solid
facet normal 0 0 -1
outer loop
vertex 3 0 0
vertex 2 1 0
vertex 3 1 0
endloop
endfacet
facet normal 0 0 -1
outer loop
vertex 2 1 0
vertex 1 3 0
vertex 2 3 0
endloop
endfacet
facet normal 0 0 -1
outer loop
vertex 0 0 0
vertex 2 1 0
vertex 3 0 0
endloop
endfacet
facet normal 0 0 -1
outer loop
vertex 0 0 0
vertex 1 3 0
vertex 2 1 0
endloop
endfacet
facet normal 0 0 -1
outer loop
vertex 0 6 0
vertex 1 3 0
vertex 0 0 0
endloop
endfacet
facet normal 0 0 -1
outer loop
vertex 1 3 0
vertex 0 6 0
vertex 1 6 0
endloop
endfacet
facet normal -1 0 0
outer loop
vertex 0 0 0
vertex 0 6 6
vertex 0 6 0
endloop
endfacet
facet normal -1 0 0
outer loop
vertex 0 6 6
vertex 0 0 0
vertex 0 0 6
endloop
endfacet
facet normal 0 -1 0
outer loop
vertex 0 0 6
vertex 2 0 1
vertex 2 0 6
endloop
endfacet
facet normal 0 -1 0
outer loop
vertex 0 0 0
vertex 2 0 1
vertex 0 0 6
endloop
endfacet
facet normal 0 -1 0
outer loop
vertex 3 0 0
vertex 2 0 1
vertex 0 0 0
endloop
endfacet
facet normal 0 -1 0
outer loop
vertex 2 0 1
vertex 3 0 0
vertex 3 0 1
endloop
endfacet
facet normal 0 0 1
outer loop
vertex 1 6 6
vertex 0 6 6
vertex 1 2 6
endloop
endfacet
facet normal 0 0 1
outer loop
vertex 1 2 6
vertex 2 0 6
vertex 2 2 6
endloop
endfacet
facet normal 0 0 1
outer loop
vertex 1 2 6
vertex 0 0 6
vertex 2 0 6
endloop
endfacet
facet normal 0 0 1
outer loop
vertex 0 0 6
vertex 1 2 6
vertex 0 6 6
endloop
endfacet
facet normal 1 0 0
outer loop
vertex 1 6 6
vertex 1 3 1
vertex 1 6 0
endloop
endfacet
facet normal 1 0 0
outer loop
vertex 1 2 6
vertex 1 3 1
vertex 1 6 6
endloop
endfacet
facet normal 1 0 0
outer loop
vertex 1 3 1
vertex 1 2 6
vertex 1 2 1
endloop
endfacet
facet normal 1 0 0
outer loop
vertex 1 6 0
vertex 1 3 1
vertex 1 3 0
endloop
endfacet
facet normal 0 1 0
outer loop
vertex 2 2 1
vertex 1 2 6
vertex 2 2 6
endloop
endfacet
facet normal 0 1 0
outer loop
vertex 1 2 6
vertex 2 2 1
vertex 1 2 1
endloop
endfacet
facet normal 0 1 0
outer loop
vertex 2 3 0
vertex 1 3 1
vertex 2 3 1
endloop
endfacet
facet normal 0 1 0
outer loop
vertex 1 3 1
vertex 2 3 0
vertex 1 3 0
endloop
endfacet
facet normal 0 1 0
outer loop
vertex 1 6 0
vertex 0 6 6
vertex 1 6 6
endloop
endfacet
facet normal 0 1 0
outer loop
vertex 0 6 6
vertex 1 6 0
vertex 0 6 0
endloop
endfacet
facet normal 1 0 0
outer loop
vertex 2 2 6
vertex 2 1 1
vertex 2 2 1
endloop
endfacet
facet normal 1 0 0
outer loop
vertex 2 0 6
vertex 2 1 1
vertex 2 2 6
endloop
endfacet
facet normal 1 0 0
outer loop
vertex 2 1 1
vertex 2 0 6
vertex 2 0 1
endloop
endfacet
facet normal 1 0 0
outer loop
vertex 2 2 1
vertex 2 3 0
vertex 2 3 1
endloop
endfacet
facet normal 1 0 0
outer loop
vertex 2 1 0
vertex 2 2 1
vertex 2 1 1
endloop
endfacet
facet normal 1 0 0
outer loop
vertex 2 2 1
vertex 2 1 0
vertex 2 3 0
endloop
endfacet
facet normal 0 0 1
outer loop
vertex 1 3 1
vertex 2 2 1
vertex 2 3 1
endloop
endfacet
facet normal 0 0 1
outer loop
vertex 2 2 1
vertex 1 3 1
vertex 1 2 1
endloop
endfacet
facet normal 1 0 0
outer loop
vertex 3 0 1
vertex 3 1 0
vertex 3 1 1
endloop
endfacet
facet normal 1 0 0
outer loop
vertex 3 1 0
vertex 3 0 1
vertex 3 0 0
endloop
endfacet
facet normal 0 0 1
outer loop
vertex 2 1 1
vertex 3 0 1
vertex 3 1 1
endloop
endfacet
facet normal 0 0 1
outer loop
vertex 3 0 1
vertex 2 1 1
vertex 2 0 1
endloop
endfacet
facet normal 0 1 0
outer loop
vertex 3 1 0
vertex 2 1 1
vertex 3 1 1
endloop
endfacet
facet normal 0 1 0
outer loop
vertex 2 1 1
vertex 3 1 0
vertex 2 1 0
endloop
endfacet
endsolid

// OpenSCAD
union() {
    translate([0, 0, 0]) cube([1, 1, 1]);
    translate([0, 0, 1]) cube([1, 1, 1]);
    translate([0, 0, 2]) cube([1, 1, 1]);
    translate([0, 0, 3]) cube([1, 1, 1]);
    translate([0, 0, 4]) cube([1, 1, 1]);
    translate([0, 0, 5]) cube([1, 1, 1]);
    translate([0, 1, 0]) cube([1, 1, 1]);
    translate([0, 1, 1]) cube([1, 1, 1]);
    translate([0, 1, 2]) cube([1, 1, 1]);
    translate([0, 1, 3]) cube([1, 1, 1]);
    translate([0, 1, 4]) cube([1, 1, 1]);
    translate([0, 1, 5]) cube([1, 1, 1]);
    translate([0, 2, 0]) cube([1, 1, 1]);
    translate([0, 2, 1]) cube([1, 1, 1]);
    translate([0, 2, 2]) cube([1, 1, 1]);
    translate([0, 2, 3]) cube([1, 1, 1]);
    translate([0, 2, 4]) cube([1, 1, 1]);
    translate([0, 2, 5]) cube([1, 1, 1]);
    translate([0, 3, 0]) cube([1, 1, 1]);
    translate([0, 3, 1]) cube([1, 1, 1]);
    translate([0, 3, 2]) cube([1, 1, 1]);
    translate([0, 3, 3]) cube([1, 1, 1]);
    translate([0, 3, 4]) cube([1, 1, 1]);
    translate([0, 3, 5]) cube([1, 1, 1]);
    translate([0, 4, 0]) cube([1, 1, 1]);
    translate([0, 4, 1]) cube([1, 1, 1]);
    translate([0, 4, 2]) cube([1, 1, 1]);
    translate([0, 4, 3]) cube([1, 1, 1]);
    translate([0, 4, 4]) cube([1, 1, 1]);
    translate([0, 4, 5]) cube([1, 1, 1]);
    translate([0, 5, 0]) cube([1, 1, 1]);
    translate([0, 5, 1]) cube([1, 1, 1]);
    translate([0, 5, 2]) cube([1, 1, 1]);
    translate([0, 5, 3]) cube([1, 1, 1]);
    translate([0, 5, 4]) cube([1, 1, 1]);
    translate([0, 5, 5]) cube([1, 1, 1]);
    translate([1, 0, 0]) cube([1, 1, 1]);
    translate([1, 0, 1]) cube([1, 1, 1]);
    translate([1, 0, 2]) cube([1, 1, 1]);
    translate([1, 0, 3]) cube([1, 1, 1]);
    translate([1, 0, 4]) cube([1, 1, 1]);
    translate([1, 0, 5]) cube([1, 1, 1]);
    translate([1, 1, 0]) cube([1, 1, 1]);
    translate([1, 1, 1]) cube([1, 1, 1]);
    translate([1, 1, 2]) cube([1, 1, 1]);
    translate([1, 1, 3]) cube([1, 1, 1]);
    translate([1, 1, 4]) cube([1, 1, 1]);
    translate([1, 1, 5]) cube([1, 1, 1]);
    translate([1, 2, 0]) cube([1, 1, 1]);
    translate([2, 0, 0]) cube([1, 1, 1]);
}
